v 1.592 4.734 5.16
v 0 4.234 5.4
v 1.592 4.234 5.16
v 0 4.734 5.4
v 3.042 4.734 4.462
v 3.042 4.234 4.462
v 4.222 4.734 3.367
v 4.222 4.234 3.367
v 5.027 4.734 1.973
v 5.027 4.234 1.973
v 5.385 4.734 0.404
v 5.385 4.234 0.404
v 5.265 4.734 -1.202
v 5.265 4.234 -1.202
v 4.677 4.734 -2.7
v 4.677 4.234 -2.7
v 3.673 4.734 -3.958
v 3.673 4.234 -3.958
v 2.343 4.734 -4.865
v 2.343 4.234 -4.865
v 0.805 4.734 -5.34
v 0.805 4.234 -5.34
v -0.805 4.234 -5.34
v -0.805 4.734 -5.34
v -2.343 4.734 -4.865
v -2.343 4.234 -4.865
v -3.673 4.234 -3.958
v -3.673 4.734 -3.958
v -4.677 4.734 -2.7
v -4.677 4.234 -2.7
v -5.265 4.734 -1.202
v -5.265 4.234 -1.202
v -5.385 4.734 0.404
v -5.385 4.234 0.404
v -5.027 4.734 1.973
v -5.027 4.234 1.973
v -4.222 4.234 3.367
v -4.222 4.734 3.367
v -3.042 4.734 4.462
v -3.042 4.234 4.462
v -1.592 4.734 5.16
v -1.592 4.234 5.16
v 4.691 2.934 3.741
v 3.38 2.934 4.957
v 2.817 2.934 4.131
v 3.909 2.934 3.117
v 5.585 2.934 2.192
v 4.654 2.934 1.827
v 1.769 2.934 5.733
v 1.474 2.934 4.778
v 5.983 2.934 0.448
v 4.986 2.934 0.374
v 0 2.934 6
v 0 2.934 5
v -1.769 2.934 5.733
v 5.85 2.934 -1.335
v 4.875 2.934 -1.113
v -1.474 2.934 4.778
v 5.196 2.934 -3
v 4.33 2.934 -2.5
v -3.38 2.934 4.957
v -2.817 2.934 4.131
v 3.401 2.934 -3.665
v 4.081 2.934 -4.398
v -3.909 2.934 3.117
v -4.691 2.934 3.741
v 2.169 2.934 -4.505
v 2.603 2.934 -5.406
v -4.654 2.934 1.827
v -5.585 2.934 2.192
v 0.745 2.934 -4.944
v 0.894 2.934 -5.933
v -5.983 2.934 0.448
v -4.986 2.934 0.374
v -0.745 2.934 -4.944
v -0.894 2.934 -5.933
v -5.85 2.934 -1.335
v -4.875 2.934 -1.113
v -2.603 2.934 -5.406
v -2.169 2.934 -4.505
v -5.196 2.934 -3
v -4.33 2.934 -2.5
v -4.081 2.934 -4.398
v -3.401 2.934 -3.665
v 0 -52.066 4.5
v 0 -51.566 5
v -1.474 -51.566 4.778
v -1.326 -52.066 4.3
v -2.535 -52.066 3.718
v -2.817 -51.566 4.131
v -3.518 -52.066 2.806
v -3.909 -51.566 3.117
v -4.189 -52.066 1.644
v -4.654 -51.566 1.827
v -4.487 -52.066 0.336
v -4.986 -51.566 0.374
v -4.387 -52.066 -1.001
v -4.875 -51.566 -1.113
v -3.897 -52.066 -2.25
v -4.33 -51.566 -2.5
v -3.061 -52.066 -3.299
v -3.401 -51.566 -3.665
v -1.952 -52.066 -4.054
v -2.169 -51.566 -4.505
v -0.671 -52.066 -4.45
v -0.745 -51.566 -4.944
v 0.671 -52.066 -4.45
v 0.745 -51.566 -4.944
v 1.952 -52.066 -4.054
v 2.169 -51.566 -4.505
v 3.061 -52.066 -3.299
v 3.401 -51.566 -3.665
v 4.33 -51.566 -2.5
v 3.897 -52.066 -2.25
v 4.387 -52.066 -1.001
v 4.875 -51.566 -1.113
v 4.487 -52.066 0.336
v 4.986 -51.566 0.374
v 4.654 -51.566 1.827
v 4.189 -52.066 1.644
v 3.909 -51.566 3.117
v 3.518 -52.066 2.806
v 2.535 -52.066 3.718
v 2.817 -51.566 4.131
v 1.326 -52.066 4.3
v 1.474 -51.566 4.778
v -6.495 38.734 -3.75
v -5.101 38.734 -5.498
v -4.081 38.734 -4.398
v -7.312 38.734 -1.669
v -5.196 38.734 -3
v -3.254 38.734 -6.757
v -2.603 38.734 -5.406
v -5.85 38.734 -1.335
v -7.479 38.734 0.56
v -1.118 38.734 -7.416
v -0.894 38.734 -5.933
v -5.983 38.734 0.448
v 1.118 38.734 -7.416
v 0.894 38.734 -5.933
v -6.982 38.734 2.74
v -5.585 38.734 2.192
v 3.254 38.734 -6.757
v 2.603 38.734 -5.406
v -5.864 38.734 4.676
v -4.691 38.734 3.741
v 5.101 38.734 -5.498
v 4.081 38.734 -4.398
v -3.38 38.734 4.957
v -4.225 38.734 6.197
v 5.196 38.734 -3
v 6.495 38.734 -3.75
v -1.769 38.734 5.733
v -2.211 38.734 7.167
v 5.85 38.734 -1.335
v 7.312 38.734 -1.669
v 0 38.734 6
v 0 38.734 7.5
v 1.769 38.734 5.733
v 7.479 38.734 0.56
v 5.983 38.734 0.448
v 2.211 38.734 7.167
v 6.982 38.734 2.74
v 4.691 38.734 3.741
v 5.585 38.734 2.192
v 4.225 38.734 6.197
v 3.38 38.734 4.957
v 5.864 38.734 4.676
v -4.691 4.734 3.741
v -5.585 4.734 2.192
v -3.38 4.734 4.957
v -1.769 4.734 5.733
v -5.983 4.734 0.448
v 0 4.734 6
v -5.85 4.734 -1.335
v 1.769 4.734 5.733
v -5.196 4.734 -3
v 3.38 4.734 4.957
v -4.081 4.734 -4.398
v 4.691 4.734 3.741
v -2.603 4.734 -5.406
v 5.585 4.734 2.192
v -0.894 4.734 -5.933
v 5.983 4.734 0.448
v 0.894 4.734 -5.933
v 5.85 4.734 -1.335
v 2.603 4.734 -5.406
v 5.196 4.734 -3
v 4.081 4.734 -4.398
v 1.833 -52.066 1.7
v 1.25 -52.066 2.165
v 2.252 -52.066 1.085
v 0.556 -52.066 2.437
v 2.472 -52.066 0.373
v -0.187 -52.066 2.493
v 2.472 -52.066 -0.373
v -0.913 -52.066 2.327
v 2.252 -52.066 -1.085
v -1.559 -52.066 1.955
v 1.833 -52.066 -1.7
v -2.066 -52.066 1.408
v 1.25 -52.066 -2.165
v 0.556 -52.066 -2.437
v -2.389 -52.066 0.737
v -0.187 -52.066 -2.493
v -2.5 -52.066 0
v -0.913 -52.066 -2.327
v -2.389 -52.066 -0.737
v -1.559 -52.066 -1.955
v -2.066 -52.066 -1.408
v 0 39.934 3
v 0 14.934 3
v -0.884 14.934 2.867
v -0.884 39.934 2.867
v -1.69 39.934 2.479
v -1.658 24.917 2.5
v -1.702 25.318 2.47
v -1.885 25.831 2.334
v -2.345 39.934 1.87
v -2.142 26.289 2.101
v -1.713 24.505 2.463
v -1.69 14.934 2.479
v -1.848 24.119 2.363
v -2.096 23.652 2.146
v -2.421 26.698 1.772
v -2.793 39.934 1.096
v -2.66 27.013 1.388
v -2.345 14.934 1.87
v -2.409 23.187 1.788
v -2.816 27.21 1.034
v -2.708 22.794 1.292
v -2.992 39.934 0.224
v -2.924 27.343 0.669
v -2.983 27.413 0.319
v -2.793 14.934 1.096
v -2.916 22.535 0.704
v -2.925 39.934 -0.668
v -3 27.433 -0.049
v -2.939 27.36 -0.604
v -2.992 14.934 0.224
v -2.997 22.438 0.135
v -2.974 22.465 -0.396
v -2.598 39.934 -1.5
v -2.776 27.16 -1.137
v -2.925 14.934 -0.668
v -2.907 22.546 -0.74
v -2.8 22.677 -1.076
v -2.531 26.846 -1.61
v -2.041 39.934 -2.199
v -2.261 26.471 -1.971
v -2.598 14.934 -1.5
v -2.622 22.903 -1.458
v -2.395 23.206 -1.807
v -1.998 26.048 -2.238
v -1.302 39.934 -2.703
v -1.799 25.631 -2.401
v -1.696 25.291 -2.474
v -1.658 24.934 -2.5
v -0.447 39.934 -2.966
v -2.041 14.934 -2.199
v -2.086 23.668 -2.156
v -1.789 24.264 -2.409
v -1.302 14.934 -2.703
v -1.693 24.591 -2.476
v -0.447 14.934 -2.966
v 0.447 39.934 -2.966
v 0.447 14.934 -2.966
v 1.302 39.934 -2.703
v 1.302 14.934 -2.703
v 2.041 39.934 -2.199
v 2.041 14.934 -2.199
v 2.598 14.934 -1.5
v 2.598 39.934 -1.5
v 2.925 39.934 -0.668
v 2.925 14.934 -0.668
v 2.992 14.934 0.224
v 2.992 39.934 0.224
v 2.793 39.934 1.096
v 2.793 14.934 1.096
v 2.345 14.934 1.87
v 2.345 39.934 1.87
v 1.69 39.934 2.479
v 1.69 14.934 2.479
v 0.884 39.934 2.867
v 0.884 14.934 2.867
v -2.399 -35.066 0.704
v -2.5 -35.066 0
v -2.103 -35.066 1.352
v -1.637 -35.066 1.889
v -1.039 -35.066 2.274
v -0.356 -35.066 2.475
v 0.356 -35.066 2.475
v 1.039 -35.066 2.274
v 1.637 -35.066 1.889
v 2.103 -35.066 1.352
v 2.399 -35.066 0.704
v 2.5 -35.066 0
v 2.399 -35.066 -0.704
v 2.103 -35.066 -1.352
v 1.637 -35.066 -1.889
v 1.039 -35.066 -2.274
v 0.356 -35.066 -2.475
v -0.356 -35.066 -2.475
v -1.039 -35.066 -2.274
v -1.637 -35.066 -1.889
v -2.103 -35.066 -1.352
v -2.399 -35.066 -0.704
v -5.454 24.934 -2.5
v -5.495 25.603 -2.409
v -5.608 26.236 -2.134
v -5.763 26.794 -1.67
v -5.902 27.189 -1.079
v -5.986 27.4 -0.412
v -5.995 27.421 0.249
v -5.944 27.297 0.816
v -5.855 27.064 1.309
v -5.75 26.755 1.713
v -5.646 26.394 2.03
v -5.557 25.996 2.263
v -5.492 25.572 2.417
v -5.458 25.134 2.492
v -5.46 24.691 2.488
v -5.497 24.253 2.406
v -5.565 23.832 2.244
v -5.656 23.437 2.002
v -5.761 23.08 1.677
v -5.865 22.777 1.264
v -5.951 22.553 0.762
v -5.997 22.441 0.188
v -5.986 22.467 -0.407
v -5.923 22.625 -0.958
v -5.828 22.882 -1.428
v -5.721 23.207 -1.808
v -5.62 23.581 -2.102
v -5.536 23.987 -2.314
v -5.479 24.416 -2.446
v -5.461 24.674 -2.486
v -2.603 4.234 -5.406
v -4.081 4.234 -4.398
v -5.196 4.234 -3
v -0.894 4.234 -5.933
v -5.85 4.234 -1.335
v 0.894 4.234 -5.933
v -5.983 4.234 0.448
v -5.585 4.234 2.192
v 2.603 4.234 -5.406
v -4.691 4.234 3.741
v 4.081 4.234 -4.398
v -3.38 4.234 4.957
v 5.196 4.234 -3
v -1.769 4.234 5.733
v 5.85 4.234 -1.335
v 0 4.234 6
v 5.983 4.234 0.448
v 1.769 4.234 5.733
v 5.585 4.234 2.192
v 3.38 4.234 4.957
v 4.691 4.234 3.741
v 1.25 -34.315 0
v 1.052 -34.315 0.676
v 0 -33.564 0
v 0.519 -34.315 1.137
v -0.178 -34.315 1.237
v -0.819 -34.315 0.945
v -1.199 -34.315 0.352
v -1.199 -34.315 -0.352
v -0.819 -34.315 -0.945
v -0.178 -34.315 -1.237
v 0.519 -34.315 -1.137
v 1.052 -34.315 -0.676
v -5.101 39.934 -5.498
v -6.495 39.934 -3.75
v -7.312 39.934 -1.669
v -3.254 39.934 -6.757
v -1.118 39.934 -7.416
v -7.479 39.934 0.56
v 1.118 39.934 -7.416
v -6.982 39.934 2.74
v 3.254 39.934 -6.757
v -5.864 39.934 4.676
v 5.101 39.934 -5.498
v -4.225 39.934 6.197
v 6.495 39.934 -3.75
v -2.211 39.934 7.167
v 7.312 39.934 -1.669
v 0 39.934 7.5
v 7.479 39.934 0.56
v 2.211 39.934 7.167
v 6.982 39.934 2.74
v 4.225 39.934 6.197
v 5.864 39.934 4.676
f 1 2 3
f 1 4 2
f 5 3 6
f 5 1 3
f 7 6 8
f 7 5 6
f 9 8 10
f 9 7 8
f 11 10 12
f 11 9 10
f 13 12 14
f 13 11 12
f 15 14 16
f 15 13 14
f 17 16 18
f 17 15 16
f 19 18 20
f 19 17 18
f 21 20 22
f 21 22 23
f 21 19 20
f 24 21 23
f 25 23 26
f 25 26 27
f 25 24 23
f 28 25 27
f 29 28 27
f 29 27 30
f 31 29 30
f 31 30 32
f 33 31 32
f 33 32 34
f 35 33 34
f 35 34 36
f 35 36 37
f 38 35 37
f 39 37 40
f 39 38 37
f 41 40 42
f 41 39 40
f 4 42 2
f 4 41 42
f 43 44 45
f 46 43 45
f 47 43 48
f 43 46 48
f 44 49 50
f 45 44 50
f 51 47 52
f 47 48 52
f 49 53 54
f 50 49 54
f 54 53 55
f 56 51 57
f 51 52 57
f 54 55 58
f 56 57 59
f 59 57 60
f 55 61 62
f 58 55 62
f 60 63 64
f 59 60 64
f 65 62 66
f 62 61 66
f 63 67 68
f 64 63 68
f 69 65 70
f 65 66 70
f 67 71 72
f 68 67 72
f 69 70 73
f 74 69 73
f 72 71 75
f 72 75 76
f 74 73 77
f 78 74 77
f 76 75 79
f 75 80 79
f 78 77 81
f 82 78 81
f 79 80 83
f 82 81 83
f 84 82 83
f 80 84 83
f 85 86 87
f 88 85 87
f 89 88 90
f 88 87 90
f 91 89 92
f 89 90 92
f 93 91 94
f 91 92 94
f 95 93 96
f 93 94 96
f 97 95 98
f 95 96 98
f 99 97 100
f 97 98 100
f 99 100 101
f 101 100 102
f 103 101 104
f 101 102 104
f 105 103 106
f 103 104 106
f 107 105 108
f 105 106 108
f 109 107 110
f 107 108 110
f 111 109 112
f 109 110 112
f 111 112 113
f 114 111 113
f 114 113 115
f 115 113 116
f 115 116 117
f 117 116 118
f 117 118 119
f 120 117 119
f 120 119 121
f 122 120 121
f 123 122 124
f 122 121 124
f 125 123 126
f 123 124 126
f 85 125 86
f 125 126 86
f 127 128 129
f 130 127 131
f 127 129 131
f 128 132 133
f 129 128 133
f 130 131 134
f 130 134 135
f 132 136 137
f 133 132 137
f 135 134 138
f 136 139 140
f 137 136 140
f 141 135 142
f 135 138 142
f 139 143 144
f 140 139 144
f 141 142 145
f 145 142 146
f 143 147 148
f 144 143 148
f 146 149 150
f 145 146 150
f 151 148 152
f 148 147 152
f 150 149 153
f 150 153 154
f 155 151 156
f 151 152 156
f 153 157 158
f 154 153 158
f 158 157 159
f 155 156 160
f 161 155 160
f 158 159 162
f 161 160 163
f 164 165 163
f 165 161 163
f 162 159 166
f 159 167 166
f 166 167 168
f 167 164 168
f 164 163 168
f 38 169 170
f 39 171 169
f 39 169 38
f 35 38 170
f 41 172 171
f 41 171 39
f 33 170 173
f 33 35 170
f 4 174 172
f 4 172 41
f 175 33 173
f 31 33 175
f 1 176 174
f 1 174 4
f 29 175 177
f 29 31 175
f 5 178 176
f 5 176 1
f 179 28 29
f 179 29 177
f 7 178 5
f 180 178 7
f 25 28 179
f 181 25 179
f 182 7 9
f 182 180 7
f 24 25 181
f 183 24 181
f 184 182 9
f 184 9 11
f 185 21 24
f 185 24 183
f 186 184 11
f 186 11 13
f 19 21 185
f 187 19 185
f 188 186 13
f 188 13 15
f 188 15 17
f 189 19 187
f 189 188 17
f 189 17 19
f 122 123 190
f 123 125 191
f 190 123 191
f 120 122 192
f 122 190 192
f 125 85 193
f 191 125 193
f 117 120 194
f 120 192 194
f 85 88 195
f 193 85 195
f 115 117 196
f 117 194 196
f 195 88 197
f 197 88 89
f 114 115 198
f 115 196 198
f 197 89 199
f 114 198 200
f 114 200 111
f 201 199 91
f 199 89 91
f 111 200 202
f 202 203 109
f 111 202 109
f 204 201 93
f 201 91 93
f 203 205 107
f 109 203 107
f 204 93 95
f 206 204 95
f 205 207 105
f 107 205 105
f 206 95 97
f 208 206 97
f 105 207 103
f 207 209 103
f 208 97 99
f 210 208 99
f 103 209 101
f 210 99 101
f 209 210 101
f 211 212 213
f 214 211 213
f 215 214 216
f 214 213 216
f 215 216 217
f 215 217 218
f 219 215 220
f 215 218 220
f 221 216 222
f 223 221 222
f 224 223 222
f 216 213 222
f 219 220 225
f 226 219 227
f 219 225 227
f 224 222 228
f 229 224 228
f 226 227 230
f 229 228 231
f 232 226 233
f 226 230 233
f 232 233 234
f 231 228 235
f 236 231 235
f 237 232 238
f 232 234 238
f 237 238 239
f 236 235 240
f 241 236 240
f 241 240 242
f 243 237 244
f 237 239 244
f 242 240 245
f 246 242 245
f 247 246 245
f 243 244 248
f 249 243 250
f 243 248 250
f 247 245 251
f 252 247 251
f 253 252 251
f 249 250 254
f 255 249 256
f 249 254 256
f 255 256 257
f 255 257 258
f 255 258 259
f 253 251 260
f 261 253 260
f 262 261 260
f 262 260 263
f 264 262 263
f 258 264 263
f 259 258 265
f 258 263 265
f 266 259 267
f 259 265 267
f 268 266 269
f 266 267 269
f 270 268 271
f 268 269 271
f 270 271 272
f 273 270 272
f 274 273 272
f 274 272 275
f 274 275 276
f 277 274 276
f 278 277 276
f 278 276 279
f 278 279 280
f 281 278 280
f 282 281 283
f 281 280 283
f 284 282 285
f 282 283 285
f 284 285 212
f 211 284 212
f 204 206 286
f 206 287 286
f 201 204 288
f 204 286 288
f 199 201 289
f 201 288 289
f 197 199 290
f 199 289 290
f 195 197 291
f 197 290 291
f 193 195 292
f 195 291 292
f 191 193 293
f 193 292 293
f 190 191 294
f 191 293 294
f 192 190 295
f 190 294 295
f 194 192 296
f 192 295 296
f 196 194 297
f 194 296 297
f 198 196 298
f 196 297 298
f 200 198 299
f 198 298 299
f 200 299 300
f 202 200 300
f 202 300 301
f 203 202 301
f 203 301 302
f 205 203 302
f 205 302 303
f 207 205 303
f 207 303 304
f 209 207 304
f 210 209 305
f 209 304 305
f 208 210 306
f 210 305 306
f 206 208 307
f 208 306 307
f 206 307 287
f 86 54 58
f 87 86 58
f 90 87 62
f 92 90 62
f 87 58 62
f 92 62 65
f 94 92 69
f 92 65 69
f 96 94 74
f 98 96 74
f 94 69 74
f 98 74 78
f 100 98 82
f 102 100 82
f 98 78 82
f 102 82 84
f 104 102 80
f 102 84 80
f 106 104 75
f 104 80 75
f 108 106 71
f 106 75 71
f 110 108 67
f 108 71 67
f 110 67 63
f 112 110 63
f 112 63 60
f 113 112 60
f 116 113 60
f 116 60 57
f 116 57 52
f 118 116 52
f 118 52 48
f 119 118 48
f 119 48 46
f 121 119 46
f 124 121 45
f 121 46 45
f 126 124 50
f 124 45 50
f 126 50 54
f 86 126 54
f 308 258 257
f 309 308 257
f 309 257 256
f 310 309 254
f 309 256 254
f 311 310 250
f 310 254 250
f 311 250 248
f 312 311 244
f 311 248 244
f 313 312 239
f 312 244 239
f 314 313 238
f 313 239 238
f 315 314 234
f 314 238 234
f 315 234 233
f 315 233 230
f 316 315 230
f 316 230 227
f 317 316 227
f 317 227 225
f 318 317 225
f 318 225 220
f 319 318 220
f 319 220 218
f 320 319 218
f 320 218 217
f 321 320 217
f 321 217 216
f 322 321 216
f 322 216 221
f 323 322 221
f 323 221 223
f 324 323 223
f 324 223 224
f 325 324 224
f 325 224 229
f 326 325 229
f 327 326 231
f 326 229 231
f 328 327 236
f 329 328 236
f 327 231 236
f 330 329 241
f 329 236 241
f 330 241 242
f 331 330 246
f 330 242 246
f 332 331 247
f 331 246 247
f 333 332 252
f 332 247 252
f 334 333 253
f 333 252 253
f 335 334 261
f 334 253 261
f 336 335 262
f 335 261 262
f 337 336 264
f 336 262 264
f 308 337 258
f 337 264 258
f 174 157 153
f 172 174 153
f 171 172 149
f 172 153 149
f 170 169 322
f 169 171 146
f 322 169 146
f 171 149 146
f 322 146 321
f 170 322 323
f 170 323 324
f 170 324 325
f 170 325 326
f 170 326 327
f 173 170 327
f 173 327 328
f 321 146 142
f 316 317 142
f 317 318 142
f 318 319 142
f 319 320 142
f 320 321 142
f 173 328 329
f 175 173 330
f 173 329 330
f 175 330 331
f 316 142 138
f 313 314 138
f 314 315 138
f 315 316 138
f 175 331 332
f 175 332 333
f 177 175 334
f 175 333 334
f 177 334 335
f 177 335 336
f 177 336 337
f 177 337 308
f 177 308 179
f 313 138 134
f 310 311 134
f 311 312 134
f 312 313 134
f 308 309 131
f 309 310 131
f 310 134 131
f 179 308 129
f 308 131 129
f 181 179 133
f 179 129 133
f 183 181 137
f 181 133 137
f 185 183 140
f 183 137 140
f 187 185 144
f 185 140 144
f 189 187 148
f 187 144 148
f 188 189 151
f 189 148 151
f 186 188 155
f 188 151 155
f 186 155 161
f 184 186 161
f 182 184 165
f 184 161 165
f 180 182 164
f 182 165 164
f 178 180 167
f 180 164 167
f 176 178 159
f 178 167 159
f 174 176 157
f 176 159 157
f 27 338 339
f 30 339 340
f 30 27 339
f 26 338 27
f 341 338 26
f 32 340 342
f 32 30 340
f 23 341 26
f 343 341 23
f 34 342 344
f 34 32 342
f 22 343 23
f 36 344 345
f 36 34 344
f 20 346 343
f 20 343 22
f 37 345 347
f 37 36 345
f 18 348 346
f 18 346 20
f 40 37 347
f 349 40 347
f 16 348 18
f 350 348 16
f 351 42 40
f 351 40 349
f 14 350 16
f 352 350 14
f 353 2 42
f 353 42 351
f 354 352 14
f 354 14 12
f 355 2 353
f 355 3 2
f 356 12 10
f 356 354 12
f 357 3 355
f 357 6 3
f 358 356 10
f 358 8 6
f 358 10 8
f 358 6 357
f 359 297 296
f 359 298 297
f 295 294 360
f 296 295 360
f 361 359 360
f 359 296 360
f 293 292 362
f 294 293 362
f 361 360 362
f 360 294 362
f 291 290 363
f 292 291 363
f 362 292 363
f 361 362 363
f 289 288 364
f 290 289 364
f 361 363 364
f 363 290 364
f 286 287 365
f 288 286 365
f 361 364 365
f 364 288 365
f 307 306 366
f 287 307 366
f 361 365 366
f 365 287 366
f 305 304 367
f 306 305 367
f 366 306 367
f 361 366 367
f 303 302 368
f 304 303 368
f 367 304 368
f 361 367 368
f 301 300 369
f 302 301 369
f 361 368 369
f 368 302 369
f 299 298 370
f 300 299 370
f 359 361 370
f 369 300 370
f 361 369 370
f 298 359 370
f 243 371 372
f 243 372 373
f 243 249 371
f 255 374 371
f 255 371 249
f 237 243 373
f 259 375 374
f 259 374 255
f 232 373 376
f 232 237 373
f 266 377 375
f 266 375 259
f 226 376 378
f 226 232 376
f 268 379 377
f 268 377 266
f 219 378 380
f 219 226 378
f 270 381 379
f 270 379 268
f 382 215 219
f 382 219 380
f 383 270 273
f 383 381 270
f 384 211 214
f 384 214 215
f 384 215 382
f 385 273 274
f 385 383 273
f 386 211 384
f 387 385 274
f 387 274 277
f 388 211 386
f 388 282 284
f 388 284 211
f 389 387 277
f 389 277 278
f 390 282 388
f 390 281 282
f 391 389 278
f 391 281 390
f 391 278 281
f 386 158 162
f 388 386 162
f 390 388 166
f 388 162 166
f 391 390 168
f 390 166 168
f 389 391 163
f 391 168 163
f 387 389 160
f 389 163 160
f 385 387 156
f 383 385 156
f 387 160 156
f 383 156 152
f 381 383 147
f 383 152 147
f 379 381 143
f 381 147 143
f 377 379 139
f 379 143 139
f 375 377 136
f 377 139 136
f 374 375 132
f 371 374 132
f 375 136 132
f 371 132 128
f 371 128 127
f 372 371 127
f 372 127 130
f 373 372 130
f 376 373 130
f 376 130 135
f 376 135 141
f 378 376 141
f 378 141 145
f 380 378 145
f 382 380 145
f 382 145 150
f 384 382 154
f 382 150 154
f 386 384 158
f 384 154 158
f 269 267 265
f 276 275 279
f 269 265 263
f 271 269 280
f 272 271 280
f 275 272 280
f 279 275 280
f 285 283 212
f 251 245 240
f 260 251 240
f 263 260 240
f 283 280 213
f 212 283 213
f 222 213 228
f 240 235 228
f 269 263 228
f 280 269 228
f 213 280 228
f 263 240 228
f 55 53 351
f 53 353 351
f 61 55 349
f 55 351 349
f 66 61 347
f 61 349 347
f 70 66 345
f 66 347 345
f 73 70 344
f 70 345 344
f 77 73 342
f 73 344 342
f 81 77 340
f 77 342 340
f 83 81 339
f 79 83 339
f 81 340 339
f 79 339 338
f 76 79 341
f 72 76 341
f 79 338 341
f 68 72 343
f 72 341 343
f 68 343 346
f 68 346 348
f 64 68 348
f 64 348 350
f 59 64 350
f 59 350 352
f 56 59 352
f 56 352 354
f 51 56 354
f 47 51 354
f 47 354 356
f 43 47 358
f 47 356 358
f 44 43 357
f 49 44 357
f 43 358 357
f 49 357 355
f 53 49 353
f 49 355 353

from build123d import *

# Parameters (mm, degrees)
CHAMFER1_SIZE         = 0.5
BOSS_EXTRUDE1_START   = -1.2
SKETCH2_R             = 7.5
SKETCH2_R_2           = 3
BOSS_EXTRUDE1_DEPTH   = 1.2
SKETCH5_R             = 2.5
CUT_EXTRUDE1_DEPTH    = 54.135491794
M6_TAPPED_HOLE1_D     = 5
M6_TAPPED_HOLE1_DEPTH = 17
M6_TAPPED_HOLE1_TIP   = 1.502151548


with BuildPart() as part:
    # Sketch1 → Revolve1 (revolve)
    with BuildSketch(Plane.XY, mode=Mode.PRIVATE) as revolve1_sk:
        Polygon((-3, 39.933883493), (-3, 14.933883493), (0, 14.933883493), (0, -52.066116507), (-5, -52.066116507), (-5, 2.933883493), (-6, 2.933883493), (-6, 39.933883493), align=None)
    revolve(revolve1_sk.sketch.rotate(Axis((0, 54.453238627, 0), (0, -1, 0)), 270), axis=Axis((0, 54.453238627, 0), (0, -1, 0)))

    # Chamfer1
    chamfer1_edges = [part.edges().sort_by_distance(p)[0] for p in [
        (0, -52.066116507, -5),
    ]]
    chamfer(chamfer1_edges, length=CHAMFER1_SIZE)

    # Sketch2 → Boss-Extrude1 (add)
    with BuildSketch(Plane(origin=(0, 39.933883493, 0), x_dir=(1, 0, 0), z_dir=(0, 1, 0)).offset(BOSS_EXTRUDE1_START)):
        with Locations(Location((0, 0, 0), (0, 0, 270))):
            Circle(SKETCH2_R)
        with Locations(Location((0, 0, 0), (0, 0, 270))):
            Circle(SKETCH2_R_2, mode=Mode.SUBTRACT)
    extrude(amount=BOSS_EXTRUDE1_DEPTH)

    # Sketch4 → Groove for ANSI B27.7 - 3BM1-12, Basic Internal Retaining Ring1 (revolve, cut)
    with BuildSketch(Plane(origin=(0, 54.453238627, 0), x_dir=(0, 0, 1), z_dir=(-1, 0, 0))):
        with BuildLine():
            Line((6.225, -50.219355134), (5.4, -50.219355134))
            Line((5.4, -50.219355134), (5.4, -49.719355134))
            Line((5.4, -49.719355134), (6.225, -49.719355134))
            ThreePointArc((6.225, -49.719355134), (6.295710678, -49.748644456), (6.325, -49.819355134))
            Line((6.325, -49.819355134), (6.325, -50.119355134))
            ThreePointArc((6.325, -50.119355134), (6.295710678, -50.190065812), (6.225, -50.219355134))
        make_face()
    revolve(axis=Axis((0, 4.453238627, 0), (0, 1, 0)), mode=Mode.SUBTRACT)

    # Sketch5 → Cut-Extrude1 (cut, through all)
    with BuildSketch(Plane(origin=(0, 0, 0), x_dir=(0, 0, -1), z_dir=(1, 0, 0))):
        with Locations((0, 24.933883493)):
            Circle(SKETCH5_R)
    extrude(amount=-CUT_EXTRUDE1_DEPTH, mode=Mode.SUBTRACT)

    # M6 Tapped Hole1
    with Locations(Plane.XZ.offset(52.066116507)):
        with Locations((0, 0)):
            Hole(M6_TAPPED_HOLE1_D / 2, depth=M6_TAPPED_HOLE1_DEPTH)
            with Locations((0, 0, -(M6_TAPPED_HOLE1_DEPTH + M6_TAPPED_HOLE1_TIP / 2))):  # 118° drill point
                Cone(0, M6_TAPPED_HOLE1_D / 2, M6_TAPPED_HOLE1_TIP, mode=Mode.SUBTRACT)


solid = part.part
